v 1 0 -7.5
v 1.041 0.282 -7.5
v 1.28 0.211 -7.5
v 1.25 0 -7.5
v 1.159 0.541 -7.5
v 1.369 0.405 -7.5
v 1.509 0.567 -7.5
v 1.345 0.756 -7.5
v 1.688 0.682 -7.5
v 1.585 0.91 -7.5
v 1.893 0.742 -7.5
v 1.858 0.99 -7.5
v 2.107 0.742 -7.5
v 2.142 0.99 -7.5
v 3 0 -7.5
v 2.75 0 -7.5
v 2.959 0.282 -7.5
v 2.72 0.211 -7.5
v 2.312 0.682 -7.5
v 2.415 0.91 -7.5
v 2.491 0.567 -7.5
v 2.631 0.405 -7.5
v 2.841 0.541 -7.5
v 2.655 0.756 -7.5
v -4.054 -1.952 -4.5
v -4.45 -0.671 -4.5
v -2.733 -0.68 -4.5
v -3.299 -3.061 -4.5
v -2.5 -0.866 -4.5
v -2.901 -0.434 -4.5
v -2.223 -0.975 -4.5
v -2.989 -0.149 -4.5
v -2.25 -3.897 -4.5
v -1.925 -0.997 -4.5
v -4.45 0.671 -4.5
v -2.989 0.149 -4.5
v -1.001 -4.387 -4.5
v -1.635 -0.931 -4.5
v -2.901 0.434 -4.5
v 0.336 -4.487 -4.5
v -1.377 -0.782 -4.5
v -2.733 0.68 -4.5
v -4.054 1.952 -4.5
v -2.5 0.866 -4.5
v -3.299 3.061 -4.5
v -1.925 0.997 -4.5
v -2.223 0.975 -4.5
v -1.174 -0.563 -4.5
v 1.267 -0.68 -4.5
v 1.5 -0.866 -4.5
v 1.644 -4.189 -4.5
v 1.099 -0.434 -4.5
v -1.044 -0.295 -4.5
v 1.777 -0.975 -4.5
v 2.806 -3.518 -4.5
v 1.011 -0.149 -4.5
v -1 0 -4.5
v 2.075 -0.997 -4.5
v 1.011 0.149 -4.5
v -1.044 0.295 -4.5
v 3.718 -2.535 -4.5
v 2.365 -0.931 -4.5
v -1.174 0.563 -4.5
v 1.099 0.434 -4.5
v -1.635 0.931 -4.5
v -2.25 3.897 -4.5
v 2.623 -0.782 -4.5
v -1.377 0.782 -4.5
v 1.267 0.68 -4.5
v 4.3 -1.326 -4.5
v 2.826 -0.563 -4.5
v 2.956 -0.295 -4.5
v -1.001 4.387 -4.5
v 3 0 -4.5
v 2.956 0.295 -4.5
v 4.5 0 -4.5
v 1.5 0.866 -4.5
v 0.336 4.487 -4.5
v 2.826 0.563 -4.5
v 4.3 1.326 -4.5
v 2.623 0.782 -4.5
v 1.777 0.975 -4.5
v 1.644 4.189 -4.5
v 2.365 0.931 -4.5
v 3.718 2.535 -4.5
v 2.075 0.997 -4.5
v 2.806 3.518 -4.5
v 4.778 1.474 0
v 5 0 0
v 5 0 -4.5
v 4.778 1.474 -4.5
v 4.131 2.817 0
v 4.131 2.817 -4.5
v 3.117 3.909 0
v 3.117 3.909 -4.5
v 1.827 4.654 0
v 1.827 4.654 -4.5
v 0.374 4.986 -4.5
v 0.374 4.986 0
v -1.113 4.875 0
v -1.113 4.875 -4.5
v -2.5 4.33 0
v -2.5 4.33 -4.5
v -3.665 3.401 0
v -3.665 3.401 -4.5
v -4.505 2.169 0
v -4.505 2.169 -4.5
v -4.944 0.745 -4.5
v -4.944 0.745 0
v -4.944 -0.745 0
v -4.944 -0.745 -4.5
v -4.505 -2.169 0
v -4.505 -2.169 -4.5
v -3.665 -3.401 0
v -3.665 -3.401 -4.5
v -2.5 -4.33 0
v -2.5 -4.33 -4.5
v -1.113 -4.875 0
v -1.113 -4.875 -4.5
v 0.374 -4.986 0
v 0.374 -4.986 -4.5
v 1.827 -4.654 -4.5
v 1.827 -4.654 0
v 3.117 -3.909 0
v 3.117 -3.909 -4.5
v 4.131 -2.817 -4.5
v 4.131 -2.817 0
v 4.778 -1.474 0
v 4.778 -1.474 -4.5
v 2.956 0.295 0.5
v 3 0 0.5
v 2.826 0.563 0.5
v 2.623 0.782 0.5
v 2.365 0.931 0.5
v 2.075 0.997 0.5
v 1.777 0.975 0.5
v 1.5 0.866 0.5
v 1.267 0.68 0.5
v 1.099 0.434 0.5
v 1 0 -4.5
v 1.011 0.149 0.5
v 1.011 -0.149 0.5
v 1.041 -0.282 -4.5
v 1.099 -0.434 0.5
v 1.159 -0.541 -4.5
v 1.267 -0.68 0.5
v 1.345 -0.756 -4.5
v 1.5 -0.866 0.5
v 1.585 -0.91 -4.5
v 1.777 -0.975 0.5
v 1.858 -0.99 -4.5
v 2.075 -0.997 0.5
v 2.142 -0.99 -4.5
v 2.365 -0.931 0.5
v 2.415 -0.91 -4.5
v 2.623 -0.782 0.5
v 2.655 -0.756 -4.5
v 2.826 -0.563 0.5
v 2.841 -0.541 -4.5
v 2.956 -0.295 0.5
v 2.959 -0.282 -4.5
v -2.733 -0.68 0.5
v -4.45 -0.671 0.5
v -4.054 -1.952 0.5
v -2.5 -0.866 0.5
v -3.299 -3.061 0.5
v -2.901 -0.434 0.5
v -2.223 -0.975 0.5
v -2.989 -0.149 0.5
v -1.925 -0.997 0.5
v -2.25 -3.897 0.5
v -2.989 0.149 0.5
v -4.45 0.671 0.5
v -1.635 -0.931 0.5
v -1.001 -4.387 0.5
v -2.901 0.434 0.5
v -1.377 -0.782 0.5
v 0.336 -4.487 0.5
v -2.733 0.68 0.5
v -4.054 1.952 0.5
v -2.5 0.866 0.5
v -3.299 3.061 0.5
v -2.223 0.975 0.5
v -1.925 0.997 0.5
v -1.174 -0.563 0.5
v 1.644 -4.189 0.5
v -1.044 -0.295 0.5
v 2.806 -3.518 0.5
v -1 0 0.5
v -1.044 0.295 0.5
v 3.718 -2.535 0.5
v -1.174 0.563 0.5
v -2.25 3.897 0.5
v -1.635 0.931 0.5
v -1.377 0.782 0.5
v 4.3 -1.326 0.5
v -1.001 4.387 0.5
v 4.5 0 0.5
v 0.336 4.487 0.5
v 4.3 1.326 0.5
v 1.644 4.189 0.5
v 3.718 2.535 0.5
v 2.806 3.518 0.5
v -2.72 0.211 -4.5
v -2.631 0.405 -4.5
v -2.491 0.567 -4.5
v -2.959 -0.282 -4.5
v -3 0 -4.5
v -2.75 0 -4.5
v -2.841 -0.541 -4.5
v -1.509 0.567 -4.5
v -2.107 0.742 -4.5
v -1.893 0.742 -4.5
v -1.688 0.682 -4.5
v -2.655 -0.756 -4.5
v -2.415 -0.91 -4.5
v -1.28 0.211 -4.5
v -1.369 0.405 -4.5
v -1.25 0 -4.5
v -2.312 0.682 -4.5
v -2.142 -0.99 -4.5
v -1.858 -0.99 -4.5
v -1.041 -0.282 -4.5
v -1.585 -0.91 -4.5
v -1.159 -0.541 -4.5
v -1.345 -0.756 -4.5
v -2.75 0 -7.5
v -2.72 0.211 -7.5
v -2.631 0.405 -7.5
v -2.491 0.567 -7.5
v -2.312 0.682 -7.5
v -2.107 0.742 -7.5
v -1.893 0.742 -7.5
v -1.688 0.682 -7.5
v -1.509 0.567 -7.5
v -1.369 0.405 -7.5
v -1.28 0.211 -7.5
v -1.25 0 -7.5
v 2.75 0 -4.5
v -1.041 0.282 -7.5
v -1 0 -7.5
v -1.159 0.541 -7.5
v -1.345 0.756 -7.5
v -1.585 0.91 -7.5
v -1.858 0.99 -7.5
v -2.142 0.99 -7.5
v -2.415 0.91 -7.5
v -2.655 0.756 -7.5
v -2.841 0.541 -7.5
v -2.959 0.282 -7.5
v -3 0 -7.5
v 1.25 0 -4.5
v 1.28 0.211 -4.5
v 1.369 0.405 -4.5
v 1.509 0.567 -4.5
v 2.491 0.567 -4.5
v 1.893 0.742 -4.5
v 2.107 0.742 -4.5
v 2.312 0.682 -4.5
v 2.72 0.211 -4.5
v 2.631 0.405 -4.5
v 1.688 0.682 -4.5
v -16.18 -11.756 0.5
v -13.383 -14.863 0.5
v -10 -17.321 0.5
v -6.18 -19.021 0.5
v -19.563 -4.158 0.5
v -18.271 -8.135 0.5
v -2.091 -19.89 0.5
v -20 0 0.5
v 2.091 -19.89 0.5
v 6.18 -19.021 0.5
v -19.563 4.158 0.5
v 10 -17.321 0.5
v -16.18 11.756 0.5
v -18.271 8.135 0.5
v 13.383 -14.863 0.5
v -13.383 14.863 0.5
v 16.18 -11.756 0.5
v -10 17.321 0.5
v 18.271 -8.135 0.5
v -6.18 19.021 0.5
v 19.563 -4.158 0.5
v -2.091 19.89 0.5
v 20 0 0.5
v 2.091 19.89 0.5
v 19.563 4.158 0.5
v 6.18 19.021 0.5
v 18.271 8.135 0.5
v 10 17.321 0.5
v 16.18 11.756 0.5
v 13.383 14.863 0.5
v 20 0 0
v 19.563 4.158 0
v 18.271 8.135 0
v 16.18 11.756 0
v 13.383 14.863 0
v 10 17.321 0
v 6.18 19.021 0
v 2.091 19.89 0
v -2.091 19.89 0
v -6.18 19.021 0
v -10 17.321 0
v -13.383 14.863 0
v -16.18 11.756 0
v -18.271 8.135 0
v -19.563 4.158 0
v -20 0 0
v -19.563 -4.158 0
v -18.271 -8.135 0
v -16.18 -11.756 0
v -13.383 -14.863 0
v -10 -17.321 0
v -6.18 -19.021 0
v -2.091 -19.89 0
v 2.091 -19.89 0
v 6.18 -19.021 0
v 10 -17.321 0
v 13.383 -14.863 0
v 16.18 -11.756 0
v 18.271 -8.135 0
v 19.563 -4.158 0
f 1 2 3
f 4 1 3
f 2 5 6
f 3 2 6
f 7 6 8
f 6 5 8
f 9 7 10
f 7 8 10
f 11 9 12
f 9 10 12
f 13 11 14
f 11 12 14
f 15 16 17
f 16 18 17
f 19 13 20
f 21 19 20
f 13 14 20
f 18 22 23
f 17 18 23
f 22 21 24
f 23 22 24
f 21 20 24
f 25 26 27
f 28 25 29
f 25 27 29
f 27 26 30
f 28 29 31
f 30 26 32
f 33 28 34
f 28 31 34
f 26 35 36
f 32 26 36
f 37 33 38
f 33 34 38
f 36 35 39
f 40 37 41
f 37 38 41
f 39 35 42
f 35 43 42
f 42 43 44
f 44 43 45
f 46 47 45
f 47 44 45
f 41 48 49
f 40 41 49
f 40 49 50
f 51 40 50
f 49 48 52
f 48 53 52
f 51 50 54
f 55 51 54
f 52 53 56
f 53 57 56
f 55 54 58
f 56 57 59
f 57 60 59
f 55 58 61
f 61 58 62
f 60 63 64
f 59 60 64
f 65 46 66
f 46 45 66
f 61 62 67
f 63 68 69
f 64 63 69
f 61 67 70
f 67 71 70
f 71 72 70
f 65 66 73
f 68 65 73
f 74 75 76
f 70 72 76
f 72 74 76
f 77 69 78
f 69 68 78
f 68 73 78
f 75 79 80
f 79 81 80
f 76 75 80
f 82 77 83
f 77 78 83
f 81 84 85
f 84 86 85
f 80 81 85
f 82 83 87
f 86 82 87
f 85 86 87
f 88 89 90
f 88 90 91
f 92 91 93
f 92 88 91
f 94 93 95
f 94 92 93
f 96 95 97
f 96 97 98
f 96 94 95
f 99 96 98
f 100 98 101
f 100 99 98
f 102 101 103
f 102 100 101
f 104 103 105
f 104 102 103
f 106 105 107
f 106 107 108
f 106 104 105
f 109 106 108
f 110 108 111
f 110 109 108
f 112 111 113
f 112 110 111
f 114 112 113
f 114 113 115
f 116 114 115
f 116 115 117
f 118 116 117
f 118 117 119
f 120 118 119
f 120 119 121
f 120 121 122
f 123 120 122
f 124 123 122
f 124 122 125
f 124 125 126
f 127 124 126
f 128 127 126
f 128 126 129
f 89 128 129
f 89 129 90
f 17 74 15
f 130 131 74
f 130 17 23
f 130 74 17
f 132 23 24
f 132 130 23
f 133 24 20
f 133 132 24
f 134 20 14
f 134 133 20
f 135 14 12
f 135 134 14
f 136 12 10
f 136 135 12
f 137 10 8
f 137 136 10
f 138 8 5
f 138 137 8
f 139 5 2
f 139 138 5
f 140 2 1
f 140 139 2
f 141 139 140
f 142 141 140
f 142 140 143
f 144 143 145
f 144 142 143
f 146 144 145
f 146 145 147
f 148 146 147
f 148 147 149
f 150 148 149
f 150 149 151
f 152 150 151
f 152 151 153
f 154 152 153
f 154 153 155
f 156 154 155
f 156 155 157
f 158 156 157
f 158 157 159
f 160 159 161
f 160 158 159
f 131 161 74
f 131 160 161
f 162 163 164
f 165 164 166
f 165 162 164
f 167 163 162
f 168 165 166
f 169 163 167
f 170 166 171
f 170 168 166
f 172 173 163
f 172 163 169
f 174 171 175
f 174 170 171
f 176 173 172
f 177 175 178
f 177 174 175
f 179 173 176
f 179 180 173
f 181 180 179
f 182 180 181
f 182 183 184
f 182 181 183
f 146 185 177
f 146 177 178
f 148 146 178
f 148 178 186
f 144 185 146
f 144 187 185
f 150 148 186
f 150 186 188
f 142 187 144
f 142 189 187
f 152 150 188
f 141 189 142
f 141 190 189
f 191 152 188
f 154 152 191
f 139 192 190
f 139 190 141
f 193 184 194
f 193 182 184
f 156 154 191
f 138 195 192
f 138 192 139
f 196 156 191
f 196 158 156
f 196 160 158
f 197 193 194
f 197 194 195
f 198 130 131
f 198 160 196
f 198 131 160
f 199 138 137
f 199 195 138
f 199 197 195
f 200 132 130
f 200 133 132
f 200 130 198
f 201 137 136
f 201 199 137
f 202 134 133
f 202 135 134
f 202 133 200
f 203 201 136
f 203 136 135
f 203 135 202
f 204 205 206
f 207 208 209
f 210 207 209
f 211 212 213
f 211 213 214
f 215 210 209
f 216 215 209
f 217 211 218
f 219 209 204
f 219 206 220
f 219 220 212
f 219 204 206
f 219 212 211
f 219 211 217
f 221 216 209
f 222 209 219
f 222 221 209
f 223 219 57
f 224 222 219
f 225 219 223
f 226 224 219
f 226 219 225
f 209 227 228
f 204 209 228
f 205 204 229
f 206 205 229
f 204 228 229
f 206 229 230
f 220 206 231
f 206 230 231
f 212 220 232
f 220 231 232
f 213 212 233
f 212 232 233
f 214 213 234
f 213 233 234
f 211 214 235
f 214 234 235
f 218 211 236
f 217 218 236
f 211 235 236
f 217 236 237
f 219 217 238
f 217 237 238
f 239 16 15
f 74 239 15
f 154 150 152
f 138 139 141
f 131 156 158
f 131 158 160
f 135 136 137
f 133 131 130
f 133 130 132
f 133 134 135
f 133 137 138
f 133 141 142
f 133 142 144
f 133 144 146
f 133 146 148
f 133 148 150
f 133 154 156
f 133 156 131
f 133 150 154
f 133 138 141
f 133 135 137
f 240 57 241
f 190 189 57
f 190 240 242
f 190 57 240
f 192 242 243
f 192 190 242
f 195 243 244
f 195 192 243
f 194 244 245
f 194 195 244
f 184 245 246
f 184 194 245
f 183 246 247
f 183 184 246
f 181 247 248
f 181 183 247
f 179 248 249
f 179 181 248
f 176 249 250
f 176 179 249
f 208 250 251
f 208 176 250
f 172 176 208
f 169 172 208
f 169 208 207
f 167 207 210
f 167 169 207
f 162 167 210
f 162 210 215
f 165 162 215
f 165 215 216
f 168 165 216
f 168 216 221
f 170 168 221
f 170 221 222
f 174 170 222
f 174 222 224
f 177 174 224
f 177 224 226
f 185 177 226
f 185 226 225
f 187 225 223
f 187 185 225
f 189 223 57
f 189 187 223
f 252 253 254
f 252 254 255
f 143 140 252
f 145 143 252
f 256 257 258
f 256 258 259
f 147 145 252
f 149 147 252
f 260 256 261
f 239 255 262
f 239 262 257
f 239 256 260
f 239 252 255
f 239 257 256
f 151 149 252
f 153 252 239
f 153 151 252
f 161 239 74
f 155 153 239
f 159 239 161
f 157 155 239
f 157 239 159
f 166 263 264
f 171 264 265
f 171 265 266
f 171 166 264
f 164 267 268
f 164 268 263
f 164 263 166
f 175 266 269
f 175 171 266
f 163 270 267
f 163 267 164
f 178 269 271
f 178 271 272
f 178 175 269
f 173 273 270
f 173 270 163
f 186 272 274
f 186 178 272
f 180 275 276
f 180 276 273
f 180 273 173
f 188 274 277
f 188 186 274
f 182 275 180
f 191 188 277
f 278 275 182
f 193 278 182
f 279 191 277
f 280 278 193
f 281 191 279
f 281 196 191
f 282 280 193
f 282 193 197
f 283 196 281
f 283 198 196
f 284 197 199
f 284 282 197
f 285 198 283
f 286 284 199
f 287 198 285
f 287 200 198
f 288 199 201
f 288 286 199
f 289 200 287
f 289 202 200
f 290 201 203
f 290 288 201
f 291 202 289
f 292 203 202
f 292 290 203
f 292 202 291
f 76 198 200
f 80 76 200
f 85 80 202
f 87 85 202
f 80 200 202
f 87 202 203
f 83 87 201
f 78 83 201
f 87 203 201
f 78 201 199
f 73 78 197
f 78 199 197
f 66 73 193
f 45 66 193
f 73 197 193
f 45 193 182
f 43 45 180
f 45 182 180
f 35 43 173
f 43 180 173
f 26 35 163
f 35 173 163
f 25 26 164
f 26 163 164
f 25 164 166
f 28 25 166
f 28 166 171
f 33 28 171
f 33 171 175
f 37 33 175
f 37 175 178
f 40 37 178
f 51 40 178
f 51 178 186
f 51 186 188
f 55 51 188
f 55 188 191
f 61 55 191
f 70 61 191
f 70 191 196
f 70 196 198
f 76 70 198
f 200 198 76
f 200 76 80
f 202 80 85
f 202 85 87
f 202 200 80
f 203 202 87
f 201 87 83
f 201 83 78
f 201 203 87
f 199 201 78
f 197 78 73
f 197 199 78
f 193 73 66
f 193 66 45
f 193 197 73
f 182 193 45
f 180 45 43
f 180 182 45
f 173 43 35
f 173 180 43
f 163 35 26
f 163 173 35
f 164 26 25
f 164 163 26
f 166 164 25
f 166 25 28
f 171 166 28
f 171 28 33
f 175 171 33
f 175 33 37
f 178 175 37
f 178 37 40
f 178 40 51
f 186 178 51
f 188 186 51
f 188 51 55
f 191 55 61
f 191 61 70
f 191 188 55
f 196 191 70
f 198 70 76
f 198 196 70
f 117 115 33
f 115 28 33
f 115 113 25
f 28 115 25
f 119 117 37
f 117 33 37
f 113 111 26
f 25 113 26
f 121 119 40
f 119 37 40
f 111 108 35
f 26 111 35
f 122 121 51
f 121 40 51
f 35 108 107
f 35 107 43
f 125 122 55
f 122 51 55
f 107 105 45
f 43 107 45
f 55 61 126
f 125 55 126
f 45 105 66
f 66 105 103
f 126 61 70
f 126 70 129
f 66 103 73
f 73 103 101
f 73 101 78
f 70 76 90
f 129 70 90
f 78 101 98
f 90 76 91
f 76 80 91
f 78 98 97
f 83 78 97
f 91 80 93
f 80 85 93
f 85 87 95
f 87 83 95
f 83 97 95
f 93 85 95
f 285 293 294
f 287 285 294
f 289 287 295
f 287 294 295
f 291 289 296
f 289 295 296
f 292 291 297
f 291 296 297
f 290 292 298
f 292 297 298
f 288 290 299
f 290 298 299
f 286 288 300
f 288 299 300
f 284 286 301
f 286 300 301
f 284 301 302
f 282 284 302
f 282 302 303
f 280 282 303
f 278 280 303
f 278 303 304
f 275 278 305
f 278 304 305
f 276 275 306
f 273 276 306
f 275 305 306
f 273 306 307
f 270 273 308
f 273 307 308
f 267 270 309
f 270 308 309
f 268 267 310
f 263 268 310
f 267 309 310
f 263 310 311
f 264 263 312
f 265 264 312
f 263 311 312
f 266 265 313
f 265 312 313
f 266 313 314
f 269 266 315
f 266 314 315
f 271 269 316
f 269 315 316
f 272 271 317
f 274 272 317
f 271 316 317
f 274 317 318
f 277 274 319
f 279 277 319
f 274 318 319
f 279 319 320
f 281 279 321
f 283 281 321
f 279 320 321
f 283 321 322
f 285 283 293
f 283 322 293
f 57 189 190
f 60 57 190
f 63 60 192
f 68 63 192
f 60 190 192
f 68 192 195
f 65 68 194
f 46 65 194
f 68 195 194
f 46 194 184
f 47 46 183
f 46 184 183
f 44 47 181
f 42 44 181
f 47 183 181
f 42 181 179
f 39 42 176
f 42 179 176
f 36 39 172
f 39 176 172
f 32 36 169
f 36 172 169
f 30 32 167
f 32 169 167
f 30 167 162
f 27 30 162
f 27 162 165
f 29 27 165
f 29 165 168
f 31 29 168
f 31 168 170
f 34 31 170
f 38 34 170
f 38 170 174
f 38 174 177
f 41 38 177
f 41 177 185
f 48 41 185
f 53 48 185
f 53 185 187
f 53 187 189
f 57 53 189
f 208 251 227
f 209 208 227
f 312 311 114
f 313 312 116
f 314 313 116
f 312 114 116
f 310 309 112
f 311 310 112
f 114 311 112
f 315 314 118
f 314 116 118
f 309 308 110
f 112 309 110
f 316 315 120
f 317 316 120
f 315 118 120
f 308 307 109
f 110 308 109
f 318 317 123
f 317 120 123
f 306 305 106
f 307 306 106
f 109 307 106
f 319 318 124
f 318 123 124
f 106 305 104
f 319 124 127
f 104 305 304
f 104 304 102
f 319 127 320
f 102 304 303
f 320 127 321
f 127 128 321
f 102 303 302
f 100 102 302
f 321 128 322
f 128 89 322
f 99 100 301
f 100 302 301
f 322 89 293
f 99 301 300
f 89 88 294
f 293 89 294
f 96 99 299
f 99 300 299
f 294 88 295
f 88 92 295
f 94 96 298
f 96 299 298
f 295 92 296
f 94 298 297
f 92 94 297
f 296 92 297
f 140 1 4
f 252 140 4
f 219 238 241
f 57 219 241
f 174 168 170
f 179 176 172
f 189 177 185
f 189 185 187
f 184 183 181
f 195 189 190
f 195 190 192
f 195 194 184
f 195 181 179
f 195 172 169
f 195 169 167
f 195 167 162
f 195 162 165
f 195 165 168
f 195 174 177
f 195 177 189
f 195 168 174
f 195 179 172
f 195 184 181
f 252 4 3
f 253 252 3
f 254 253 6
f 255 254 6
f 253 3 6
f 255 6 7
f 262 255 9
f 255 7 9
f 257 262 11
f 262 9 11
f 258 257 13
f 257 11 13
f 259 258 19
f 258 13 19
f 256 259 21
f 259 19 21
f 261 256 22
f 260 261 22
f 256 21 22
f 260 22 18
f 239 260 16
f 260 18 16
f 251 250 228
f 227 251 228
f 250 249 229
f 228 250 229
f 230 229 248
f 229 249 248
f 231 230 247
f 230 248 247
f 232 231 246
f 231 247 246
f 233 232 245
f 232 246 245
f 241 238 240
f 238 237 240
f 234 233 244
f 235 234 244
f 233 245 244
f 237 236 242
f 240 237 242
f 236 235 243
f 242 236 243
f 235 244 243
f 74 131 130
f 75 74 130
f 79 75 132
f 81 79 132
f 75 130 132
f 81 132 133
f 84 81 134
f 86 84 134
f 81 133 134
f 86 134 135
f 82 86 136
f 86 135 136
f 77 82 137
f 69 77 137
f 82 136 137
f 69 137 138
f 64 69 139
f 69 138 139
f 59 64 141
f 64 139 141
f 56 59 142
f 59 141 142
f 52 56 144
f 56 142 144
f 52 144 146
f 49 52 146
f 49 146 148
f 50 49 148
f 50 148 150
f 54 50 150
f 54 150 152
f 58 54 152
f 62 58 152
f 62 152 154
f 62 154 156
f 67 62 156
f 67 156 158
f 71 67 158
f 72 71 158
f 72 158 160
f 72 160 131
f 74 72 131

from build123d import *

# Parameters (mm, degrees)
F0_R      = 20
F1_DEPTH  = 0.5
F2_R      = 5
F3_DEPTH  = 5
F4_R      = 4.5
F5_DEPTH  = 25
F6_R      = 4.5
F7_DEPTH  = 5
F8_R      = 1
F9_DEPTH  = 8
F11_DEPTH = 3
F12_R     = 1
F13_DEPTH = 25


with BuildPart() as f1:
    # F0 (on Top) → F1 (new body)
    with BuildSketch(Plane.XY):
        Circle(F0_R)
    extrude(amount=F1_DEPTH)

    # F2 (on face) → F3 (join)
    with BuildSketch(Plane.XY.offset(0.5)):
        Circle(F2_R)
    extrude(amount=-F3_DEPTH)

    # F4 (on face) → F5 (cut)
    with BuildSketch(Plane.XY.offset(0.5)):
        Circle(F4_R)
    extrude(amount=-F5_DEPTH, mode=Mode.SUBTRACT)


with BuildPart() as f7:
    # F6 (on face) → F7 (new body)
    with BuildSketch(Plane.XY.offset(0.5)):
        Circle(F6_R)
    extrude(amount=-F7_DEPTH)

    # F12 (on face) → F13 (cut)
    with BuildSketch(Plane.XY.offset(0.5)):
        with Locations((-2, 0)):
            Circle(F12_R)
        with Locations((2, 0)):
            Circle(F12_R)
    extrude(amount=-F13_DEPTH, mode=Mode.SUBTRACT)


with BuildPart() as f9:
    # F8 (on face) → F9 (new body)
    with BuildSketch(Plane.XY.offset(0.5)):
        with Locations((-2, 0)):
            Circle(F8_R)
    extrude(amount=-F9_DEPTH)


with BuildPart() as f9b:
    # F8 (on face) → F9, piece 2 (new body)
    with BuildSketch(Plane.XY.offset(0.5)):
        with Locations((2, 0)):
            Circle(F8_R)
    extrude(amount=-F9_DEPTH)


with BuildPart() as f11_tool:
    # F10 (on face) → F11 (new body)
    with BuildSketch(Plane(origin=(0, 0, -7.5), x_dir=(1, 0, 0), z_dir=(0, 0, -1))):
        with BuildLine():
            Line((-1.25, 0), (-1, 0))
            ThreePointArc((-1, 0), (-2, 1), (-3, 0))
            Line((-3, 0), (-2.75, 0))
            ThreePointArc((-2.75, 0), (-2, -0.75), (-1.25, 0))
        make_face()
        with BuildLine():
            Line((2.75, 0), (3, 0))
            ThreePointArc((3, 0), (2, 1), (1, 0))
            Line((1, 0), (1.25, 0))
            ThreePointArc((1.25, 0), (2, -0.75), (2.75, 0))
        make_face()
    extrude(amount=-F11_DEPTH)


with BuildPart() as f9_1:
    add(f9.part)

    # F11: cut by f11_tool
    add(f11_tool.part, mode=Mode.SUBTRACT)


with BuildPart() as f9b_1:
    add(f9b.part)

    # F11: cut by f11_tool
    add(f11_tool.part, mode=Mode.SUBTRACT)


solid = Compound([f1.part, f7.part, f9_1.part, f9b_1.part])
